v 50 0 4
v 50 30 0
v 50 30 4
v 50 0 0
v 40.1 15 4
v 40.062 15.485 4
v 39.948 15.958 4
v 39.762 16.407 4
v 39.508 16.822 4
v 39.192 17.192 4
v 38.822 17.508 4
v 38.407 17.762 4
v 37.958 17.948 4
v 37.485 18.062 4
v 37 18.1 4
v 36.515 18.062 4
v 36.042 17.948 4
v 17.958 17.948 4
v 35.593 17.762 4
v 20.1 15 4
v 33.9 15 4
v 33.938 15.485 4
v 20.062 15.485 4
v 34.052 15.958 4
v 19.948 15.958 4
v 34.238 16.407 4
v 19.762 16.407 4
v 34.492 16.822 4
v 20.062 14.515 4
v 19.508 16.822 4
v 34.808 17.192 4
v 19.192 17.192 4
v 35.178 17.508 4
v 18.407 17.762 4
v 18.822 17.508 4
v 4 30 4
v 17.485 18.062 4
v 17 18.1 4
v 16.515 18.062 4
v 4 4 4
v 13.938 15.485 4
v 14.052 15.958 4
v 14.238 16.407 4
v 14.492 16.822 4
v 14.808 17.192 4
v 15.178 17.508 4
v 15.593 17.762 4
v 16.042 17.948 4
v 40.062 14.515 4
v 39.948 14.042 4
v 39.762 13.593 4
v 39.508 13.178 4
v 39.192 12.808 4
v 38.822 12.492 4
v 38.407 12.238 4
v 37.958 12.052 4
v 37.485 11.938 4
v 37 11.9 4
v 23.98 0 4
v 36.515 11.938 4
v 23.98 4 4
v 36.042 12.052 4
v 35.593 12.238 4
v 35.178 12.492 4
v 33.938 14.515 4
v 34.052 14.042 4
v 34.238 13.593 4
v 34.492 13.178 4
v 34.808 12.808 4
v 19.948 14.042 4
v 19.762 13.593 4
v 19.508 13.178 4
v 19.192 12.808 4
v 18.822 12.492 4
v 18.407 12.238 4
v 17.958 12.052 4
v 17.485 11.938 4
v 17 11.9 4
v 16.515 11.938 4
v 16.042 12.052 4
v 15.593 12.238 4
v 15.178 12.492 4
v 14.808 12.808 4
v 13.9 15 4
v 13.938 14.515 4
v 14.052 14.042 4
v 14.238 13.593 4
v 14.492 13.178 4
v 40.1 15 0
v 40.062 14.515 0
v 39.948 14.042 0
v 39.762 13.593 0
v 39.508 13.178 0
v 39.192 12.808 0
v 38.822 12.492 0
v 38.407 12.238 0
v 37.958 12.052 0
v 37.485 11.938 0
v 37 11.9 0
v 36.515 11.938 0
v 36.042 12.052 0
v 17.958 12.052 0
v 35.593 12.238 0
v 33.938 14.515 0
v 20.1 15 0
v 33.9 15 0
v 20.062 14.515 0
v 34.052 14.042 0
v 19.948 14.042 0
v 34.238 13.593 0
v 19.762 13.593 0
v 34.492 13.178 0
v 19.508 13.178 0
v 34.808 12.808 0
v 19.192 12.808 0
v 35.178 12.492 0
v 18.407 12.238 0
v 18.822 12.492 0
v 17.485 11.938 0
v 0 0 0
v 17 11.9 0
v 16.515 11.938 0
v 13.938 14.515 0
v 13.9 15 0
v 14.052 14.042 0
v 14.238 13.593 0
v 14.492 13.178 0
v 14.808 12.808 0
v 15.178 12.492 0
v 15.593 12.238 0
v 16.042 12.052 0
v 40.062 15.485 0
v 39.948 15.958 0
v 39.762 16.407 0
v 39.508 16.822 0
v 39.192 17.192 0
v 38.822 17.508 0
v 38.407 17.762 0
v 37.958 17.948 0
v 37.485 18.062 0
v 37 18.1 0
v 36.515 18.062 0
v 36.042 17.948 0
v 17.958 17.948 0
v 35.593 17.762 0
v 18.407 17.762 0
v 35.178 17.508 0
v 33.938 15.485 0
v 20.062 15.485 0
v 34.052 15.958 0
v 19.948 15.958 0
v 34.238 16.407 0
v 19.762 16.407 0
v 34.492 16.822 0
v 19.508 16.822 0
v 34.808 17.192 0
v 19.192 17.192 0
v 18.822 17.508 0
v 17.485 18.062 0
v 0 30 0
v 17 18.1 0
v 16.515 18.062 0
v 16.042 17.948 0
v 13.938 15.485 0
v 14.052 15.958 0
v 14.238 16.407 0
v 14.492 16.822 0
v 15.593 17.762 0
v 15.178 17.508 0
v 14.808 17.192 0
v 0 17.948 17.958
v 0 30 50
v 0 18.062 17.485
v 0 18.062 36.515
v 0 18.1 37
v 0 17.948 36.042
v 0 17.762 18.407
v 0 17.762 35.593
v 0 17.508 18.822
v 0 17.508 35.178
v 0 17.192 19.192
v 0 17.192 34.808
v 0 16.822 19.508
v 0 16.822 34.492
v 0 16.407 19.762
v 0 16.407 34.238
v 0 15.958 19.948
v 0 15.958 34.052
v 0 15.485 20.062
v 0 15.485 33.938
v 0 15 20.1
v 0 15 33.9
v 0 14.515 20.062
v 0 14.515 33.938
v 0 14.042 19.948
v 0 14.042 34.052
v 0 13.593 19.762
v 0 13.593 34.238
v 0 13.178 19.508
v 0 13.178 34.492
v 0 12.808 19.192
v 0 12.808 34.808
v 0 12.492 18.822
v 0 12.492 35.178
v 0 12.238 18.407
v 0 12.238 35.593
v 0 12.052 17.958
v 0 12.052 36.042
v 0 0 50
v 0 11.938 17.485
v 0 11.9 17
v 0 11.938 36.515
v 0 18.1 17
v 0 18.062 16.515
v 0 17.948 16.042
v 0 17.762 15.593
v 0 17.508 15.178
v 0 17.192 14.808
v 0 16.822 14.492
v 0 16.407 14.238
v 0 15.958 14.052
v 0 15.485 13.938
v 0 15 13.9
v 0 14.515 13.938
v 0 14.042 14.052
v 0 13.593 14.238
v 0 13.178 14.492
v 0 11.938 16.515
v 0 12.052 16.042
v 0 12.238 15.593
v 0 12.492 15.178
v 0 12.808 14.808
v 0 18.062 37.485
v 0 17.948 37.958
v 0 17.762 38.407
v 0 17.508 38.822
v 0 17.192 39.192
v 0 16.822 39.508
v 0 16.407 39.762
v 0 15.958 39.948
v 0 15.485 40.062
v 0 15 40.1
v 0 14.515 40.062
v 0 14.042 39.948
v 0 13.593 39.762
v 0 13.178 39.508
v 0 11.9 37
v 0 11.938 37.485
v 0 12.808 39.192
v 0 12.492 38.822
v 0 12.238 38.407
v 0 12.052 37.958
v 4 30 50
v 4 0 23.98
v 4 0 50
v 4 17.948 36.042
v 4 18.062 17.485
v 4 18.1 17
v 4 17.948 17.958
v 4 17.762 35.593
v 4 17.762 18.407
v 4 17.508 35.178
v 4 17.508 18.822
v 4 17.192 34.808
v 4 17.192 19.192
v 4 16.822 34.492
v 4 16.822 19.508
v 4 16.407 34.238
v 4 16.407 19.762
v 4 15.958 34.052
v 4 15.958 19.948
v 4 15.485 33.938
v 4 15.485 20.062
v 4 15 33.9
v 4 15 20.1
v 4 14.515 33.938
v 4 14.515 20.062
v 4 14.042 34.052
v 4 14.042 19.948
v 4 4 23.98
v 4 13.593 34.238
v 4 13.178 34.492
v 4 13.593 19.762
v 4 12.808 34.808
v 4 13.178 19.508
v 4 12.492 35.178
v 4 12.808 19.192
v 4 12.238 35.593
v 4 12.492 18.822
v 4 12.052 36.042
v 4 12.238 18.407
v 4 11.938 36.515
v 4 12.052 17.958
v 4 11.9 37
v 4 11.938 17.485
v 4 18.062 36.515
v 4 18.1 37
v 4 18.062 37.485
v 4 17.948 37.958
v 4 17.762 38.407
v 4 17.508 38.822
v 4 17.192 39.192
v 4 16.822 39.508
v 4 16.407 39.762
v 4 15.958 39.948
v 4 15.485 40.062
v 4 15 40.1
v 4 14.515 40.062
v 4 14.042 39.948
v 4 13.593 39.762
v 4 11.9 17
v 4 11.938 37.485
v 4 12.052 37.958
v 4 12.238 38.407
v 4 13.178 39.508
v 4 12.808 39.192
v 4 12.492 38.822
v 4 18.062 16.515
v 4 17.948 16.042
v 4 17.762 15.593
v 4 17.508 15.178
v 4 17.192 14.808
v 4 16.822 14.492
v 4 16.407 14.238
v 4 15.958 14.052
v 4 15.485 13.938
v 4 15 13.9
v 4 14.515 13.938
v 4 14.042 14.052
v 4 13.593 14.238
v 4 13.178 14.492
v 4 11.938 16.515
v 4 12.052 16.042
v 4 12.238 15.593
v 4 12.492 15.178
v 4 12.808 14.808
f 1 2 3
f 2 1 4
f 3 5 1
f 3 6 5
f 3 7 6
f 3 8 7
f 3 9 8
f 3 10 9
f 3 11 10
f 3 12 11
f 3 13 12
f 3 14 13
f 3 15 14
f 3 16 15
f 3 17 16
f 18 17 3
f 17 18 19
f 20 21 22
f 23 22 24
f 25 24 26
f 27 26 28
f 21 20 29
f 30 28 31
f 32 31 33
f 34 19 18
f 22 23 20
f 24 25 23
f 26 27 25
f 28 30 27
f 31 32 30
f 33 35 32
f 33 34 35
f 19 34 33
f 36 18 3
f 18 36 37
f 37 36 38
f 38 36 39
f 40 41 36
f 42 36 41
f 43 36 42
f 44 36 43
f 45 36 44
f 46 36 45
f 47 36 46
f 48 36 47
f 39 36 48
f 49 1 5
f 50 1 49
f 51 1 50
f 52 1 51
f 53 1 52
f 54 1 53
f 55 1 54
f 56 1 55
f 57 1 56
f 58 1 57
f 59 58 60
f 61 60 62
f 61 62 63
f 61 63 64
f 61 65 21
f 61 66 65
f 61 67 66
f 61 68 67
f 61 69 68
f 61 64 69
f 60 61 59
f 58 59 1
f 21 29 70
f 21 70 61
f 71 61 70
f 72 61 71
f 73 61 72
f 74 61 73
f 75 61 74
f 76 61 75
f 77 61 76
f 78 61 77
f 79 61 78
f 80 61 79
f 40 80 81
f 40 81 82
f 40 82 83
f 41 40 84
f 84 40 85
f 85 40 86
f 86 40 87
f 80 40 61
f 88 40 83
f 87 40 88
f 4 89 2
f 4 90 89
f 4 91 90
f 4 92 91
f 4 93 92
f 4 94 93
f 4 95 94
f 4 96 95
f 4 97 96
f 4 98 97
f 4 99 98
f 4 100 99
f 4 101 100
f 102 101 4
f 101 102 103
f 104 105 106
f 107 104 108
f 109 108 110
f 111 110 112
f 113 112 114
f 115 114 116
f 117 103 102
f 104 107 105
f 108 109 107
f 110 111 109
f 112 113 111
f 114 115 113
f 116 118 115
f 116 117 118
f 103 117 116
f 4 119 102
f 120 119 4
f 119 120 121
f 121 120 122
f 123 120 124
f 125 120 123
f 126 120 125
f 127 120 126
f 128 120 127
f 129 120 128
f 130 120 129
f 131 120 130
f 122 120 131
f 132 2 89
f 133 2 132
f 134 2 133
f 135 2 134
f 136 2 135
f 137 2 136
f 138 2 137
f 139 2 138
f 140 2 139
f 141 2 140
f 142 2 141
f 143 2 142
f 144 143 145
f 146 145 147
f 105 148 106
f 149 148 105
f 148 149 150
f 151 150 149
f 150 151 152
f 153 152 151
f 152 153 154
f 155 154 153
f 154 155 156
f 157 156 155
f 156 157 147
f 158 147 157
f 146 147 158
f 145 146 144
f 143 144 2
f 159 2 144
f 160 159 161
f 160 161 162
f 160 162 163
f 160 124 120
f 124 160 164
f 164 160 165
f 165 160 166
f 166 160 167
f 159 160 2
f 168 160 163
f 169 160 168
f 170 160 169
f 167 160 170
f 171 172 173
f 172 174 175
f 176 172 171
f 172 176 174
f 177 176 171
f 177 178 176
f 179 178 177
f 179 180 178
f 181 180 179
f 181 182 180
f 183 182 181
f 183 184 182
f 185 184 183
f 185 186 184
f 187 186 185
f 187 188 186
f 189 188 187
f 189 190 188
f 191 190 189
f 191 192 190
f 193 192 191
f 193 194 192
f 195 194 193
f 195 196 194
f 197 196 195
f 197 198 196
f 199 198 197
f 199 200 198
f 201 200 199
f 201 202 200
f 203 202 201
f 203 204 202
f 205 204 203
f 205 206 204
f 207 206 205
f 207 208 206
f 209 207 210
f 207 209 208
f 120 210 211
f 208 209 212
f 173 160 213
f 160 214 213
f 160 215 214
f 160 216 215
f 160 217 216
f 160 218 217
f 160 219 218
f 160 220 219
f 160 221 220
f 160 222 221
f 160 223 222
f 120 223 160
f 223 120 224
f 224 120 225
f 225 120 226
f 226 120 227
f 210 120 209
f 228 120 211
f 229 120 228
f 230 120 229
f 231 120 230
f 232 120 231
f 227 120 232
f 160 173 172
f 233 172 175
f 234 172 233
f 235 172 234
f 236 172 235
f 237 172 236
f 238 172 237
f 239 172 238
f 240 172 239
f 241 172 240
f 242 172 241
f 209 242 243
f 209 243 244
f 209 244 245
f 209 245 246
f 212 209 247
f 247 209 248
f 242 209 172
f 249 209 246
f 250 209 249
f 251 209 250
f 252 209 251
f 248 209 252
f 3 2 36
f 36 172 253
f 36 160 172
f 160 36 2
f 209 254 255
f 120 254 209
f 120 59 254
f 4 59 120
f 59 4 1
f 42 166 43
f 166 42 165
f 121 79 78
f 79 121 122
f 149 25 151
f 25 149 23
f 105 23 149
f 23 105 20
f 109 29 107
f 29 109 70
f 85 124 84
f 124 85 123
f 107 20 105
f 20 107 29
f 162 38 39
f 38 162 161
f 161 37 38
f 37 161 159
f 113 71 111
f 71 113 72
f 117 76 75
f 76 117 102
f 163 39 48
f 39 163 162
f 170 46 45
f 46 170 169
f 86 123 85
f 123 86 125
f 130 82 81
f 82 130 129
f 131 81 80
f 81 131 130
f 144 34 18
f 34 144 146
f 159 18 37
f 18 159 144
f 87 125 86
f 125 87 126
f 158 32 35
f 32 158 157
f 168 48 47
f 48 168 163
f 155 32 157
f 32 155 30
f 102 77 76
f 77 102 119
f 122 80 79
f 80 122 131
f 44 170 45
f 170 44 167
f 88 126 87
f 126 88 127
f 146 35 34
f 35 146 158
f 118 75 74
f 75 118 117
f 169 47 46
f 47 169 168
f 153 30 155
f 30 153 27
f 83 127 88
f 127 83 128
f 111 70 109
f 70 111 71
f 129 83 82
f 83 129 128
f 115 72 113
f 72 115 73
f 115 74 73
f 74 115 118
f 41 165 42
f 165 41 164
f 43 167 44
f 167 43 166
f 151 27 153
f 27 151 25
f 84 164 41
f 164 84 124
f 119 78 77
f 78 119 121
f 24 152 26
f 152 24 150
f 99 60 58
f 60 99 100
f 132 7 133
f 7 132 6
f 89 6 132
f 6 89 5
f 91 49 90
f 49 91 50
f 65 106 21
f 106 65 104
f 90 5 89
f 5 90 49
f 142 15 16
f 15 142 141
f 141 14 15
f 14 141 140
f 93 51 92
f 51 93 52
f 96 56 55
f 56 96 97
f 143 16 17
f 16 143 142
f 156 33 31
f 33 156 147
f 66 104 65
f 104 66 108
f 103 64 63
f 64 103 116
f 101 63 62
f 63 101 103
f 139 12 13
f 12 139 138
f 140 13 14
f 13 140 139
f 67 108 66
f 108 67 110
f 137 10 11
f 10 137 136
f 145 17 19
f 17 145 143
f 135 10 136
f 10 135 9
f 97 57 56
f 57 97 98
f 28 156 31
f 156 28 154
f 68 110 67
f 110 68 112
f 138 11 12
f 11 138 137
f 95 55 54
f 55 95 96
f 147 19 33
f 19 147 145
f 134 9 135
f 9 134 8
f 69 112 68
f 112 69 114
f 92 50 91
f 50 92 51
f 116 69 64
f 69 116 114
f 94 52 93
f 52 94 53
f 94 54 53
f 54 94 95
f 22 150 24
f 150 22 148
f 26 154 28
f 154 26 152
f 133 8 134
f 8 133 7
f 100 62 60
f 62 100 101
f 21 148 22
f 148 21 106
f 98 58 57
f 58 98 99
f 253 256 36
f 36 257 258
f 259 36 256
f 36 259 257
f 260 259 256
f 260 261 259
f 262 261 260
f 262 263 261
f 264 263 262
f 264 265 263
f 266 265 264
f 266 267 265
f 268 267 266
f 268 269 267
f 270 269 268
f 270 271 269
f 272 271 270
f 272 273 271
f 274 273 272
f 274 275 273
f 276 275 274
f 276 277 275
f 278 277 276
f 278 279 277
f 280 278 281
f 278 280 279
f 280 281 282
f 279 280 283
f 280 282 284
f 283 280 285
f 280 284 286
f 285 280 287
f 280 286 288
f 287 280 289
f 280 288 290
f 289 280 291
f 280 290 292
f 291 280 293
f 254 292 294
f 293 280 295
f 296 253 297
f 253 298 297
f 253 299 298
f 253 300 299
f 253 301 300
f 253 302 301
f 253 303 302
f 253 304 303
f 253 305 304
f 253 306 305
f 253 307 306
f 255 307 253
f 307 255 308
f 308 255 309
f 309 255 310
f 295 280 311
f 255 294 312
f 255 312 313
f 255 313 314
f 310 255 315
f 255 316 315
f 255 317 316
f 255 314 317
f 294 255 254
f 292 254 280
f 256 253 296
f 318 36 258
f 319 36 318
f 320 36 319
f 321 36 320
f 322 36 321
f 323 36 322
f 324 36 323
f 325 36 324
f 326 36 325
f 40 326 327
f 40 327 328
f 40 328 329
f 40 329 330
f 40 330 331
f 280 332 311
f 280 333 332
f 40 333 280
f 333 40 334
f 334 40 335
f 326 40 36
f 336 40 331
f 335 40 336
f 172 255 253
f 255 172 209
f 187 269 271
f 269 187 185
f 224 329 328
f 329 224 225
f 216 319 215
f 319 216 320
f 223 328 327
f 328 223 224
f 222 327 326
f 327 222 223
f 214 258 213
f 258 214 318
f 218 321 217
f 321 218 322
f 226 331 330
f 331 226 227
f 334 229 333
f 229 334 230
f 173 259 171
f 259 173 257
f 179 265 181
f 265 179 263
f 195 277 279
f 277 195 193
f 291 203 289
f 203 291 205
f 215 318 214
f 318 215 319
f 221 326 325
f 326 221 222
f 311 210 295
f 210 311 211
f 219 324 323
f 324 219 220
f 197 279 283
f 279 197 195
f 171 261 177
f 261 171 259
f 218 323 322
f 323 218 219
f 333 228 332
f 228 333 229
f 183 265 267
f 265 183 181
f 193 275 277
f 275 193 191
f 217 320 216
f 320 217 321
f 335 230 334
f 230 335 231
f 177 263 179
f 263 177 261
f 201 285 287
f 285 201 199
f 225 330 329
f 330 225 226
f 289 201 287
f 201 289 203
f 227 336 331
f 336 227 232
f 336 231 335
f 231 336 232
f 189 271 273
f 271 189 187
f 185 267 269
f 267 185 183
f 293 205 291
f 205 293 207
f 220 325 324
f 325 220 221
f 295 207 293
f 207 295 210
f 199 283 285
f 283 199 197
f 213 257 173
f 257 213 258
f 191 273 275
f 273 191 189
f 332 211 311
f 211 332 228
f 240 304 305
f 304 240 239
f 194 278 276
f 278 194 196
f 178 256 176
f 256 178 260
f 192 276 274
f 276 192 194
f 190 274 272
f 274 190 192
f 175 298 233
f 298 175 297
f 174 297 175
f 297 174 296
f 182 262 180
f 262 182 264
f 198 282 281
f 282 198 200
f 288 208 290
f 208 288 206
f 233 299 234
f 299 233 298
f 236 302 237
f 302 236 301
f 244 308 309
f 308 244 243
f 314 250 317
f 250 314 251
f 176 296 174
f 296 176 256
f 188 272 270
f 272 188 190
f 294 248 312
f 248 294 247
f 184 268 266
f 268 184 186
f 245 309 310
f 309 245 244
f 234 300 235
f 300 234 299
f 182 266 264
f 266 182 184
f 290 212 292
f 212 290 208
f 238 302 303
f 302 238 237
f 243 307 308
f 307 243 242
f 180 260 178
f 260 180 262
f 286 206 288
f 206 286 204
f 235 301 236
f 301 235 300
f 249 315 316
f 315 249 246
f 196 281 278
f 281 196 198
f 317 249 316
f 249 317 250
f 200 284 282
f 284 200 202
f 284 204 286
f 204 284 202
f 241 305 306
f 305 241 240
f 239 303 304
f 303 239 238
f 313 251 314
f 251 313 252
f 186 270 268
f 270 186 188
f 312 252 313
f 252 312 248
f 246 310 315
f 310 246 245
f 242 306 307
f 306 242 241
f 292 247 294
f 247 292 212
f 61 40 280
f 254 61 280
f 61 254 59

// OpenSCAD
// project		: mT-101
// parts 		: profile (width 30mm)
// printable 	: yes

// author 		: vincent
// date   		: 6.20.2013

// www.metarobotics.com
// It is licensed under the Creative Commons - GNU GPL license.

//simple usage
//profile30(length=100,female=false);

module profile30_inner_slice(width=10.3,width2=6.3,height=10.5,margin_corner=3,marginy=2)
{
	margin2 = (width-width2)/2;
	array1=[[0,height],[0,height-marginy],[margin2,height-marginy],[margin2,height]];
	array2=[[width,height],[width,height-marginy],[width-margin2,height-marginy],[width-margin2,height]];

	difference()
	{
		polygon(points=[[0,0],[width,0],[width,height],[0,height]]);
		polygon(points=[[0,0],[0,margin_corner],[margin_corner,0]]);
		polygon(points=[[width,0],[width,margin_corner],[width-margin_corner,0]]);
		polygon(points=array1);
		polygon(points=array2);
	}
}

module profile30_inner_connector(width=10.1,width2=6.1,height=10.3,margin_corner=3,marginy=2)
{
	margin2 = (width-width2)/2;
	array1=[[0,height],[0,height-marginy],[margin2,height-marginy],[margin2,height]];
	array2=[[width,height],[width,height-marginy],[width-margin2,height-marginy],[width-margin2,height]];

	difference()
	{
		polygon(points=[[0,0],[width,0],[width,height],[0,height]]);
		polygon(points=[[0,0],[0,margin_corner],[margin_corner,0]]);
		polygon(points=[[width,0],[width,margin_corner],[width-margin_corner,0]]);
		polygon(points=array1);
		polygon(points=array2);
	}
}

module profile30_inner_connector_rounded(width=8.0,width2=4.0,height=8.2,margin_corner=2.6,marginy=2)
{
	$fa = 5;
	$fn = 20;

	margin2 = (width-width2)/2;
	array1=[[0,height],[0,height-marginy],[margin2,height-marginy],[margin2,height]];
	array2=[[width,height],[width,height-marginy],[width-margin2,height-marginy],[width-margin2,height]];

	minkowski()
	{
		translate([1,1,0])
		linear_extrude(height=20)
		difference()
		{
			polygon(points=[[0,0],[width,0],[width,height],[0,height]]);
			polygon(points=[[0,0],[0,margin_corner],[margin_corner,0]]);
			polygon(points=[[width,0],[width,margin_corner],[width-margin_corner,0]]);
			polygon(points=array1);
			polygon(points=array2);
		}

		sphere(1);
	}
}

profile30_bracket();
module profile30_bracket()
{
	//$fa = 1;
	$fn = 40;

	width=30;
	length=50;

	thickness = 4;

	difference()
	{
		cube([length,width,thickness]);

		translate([17, 15, -0.1])
		cylinder(h=thickness+0.2,r=3.1);

		translate([37, 15, -0.1])
		cylinder(h=thickness+0.2,r=3.1);
	}

	difference()
	{
		cube([thickness,width,length]);

		translate([-0.1, 15, 17])
		rotate([0,90,0])
		cylinder(h=thickness+0.2,r=3.1);

		translate([-0.1, 15, 37])
		rotate([0,90,0])
		cylinder(h=thickness+0.2,r=3.1);
	}

	//supportTriangle
	triangle_width=20;
	trianglePoints=[[0,0],[0,triangle_width],[triangle_width,0]];

	{
		translate([thickness-0.01,thickness,thickness-0.01])
		rotate([90,0,0])
		linear_extrude(height=thickness)
		polygon(points=trianglePoints, paths=[[0,1,2]]);
/*
		translate([thickness-0.01,30,thickness])
		rotate([90,0,0])
		linear_extrude(height=thickness)
		polygon(points=trianglePoints, paths=[[0,1,2]]);*/
	}

}

module profile_slice30(length=100,width=30,inner_width=20,hole_dia=3,center_dia=5,female=true)
{
	margin1=(width-inner_width)/2;
	margin2=4;
	inner_slice_width=10.3;
	inner_slice_height=10.5;
	socket_length=6;

	translate([-width/2,-width/2,0])
	linear_extrude(height=length,center=true)
	difference()
	{
		square(width,width);
		translate([width/2-inner_slice_width/2,width-inner_slice_height,0]) profile30_inner_slice();
		translate([inner_slice_height,width/2-inner_slice_width/2,0]) rotate([0,0,90]) profile30_inner_slice();
		translate([width-inner_slice_width,inner_slice_height,0]) rotate([0,0,180]) profile30_inner_slice();
		translate([width-inner_slice_height,width/2+inner_slice_width/2,0]) rotate([0,0,270]) profile30_inner_slice();

		//hole
		translate([margin1,margin1]) circle(r=hole_dia);
		translate([margin1,width-margin1]) circle(r=hole_dia);
		translate([width-margin1,margin1]) circle(r=hole_dia);
		translate([width-margin1,width-margin1]) circle(r=hole_dia);
		translate([width/2,width/2]) circle(r=center_dia/2);
	}

	if(female==false)
	{
		//socket
		translate([-width/2,-width/2,length/2])
		difference()
		{
			union()
			{
				linear_extrude(height=2*socket_length,center=true)
				union()
				{
					translate([margin1,margin1]) circle(r=hole_dia);
					translate([margin1,width-margin1]) circle(r=hole_dia);
					translate([width-margin1,margin1]) circle(r=hole_dia);
					translate([width-margin1,width-margin1]) circle(r=hole_dia);
				}

				translate([0,0,socket_length])
				union()
				{
					translate([margin1,margin1]) cylinder(h=socket_length/2,r1=hole_dia,r2=hole_dia/2);
					translate([margin1,width-margin1]) cylinder(h=socket_length/2,r1=hole_dia,r2=hole_dia/2);
					translate([width-margin1,margin1]) cylinder(h=socket_length/2,r1=hole_dia,r2=hole_dia/2);
					translate([width-margin1,width-margin1]) cylinder(h=socket_length/2,r1=hole_dia,r2=hole_dia/2);
				}
			}

			translate([0,0,-socket_length-0.01])
			union()
			{
				translate([margin1,margin1]) cylinder(h=socket_length/2,r1=hole_dia,r2=hole_dia/2);
				translate([margin1,width-margin1]) cylinder(h=socket_length/2,r1=hole_dia,r2=hole_dia/2);
				translate([width-margin1,margin1]) cylinder(h=socket_length/2,r1=hole_dia,r2=hole_dia/2);
				translate([width-margin1,width-margin1]) cylinder(h=socket_length/2,r1=hole_dia,r2=hole_dia/2);
			}
		}
	}
}

module profile30(length=100,hole_dia=3,width=30,female=true,isPrintable=true) {
	$fa = 1;
	$fn = 40;
	profile_slice30(length=length,width=width,hole_dia=hole_dia,female=female);
}
